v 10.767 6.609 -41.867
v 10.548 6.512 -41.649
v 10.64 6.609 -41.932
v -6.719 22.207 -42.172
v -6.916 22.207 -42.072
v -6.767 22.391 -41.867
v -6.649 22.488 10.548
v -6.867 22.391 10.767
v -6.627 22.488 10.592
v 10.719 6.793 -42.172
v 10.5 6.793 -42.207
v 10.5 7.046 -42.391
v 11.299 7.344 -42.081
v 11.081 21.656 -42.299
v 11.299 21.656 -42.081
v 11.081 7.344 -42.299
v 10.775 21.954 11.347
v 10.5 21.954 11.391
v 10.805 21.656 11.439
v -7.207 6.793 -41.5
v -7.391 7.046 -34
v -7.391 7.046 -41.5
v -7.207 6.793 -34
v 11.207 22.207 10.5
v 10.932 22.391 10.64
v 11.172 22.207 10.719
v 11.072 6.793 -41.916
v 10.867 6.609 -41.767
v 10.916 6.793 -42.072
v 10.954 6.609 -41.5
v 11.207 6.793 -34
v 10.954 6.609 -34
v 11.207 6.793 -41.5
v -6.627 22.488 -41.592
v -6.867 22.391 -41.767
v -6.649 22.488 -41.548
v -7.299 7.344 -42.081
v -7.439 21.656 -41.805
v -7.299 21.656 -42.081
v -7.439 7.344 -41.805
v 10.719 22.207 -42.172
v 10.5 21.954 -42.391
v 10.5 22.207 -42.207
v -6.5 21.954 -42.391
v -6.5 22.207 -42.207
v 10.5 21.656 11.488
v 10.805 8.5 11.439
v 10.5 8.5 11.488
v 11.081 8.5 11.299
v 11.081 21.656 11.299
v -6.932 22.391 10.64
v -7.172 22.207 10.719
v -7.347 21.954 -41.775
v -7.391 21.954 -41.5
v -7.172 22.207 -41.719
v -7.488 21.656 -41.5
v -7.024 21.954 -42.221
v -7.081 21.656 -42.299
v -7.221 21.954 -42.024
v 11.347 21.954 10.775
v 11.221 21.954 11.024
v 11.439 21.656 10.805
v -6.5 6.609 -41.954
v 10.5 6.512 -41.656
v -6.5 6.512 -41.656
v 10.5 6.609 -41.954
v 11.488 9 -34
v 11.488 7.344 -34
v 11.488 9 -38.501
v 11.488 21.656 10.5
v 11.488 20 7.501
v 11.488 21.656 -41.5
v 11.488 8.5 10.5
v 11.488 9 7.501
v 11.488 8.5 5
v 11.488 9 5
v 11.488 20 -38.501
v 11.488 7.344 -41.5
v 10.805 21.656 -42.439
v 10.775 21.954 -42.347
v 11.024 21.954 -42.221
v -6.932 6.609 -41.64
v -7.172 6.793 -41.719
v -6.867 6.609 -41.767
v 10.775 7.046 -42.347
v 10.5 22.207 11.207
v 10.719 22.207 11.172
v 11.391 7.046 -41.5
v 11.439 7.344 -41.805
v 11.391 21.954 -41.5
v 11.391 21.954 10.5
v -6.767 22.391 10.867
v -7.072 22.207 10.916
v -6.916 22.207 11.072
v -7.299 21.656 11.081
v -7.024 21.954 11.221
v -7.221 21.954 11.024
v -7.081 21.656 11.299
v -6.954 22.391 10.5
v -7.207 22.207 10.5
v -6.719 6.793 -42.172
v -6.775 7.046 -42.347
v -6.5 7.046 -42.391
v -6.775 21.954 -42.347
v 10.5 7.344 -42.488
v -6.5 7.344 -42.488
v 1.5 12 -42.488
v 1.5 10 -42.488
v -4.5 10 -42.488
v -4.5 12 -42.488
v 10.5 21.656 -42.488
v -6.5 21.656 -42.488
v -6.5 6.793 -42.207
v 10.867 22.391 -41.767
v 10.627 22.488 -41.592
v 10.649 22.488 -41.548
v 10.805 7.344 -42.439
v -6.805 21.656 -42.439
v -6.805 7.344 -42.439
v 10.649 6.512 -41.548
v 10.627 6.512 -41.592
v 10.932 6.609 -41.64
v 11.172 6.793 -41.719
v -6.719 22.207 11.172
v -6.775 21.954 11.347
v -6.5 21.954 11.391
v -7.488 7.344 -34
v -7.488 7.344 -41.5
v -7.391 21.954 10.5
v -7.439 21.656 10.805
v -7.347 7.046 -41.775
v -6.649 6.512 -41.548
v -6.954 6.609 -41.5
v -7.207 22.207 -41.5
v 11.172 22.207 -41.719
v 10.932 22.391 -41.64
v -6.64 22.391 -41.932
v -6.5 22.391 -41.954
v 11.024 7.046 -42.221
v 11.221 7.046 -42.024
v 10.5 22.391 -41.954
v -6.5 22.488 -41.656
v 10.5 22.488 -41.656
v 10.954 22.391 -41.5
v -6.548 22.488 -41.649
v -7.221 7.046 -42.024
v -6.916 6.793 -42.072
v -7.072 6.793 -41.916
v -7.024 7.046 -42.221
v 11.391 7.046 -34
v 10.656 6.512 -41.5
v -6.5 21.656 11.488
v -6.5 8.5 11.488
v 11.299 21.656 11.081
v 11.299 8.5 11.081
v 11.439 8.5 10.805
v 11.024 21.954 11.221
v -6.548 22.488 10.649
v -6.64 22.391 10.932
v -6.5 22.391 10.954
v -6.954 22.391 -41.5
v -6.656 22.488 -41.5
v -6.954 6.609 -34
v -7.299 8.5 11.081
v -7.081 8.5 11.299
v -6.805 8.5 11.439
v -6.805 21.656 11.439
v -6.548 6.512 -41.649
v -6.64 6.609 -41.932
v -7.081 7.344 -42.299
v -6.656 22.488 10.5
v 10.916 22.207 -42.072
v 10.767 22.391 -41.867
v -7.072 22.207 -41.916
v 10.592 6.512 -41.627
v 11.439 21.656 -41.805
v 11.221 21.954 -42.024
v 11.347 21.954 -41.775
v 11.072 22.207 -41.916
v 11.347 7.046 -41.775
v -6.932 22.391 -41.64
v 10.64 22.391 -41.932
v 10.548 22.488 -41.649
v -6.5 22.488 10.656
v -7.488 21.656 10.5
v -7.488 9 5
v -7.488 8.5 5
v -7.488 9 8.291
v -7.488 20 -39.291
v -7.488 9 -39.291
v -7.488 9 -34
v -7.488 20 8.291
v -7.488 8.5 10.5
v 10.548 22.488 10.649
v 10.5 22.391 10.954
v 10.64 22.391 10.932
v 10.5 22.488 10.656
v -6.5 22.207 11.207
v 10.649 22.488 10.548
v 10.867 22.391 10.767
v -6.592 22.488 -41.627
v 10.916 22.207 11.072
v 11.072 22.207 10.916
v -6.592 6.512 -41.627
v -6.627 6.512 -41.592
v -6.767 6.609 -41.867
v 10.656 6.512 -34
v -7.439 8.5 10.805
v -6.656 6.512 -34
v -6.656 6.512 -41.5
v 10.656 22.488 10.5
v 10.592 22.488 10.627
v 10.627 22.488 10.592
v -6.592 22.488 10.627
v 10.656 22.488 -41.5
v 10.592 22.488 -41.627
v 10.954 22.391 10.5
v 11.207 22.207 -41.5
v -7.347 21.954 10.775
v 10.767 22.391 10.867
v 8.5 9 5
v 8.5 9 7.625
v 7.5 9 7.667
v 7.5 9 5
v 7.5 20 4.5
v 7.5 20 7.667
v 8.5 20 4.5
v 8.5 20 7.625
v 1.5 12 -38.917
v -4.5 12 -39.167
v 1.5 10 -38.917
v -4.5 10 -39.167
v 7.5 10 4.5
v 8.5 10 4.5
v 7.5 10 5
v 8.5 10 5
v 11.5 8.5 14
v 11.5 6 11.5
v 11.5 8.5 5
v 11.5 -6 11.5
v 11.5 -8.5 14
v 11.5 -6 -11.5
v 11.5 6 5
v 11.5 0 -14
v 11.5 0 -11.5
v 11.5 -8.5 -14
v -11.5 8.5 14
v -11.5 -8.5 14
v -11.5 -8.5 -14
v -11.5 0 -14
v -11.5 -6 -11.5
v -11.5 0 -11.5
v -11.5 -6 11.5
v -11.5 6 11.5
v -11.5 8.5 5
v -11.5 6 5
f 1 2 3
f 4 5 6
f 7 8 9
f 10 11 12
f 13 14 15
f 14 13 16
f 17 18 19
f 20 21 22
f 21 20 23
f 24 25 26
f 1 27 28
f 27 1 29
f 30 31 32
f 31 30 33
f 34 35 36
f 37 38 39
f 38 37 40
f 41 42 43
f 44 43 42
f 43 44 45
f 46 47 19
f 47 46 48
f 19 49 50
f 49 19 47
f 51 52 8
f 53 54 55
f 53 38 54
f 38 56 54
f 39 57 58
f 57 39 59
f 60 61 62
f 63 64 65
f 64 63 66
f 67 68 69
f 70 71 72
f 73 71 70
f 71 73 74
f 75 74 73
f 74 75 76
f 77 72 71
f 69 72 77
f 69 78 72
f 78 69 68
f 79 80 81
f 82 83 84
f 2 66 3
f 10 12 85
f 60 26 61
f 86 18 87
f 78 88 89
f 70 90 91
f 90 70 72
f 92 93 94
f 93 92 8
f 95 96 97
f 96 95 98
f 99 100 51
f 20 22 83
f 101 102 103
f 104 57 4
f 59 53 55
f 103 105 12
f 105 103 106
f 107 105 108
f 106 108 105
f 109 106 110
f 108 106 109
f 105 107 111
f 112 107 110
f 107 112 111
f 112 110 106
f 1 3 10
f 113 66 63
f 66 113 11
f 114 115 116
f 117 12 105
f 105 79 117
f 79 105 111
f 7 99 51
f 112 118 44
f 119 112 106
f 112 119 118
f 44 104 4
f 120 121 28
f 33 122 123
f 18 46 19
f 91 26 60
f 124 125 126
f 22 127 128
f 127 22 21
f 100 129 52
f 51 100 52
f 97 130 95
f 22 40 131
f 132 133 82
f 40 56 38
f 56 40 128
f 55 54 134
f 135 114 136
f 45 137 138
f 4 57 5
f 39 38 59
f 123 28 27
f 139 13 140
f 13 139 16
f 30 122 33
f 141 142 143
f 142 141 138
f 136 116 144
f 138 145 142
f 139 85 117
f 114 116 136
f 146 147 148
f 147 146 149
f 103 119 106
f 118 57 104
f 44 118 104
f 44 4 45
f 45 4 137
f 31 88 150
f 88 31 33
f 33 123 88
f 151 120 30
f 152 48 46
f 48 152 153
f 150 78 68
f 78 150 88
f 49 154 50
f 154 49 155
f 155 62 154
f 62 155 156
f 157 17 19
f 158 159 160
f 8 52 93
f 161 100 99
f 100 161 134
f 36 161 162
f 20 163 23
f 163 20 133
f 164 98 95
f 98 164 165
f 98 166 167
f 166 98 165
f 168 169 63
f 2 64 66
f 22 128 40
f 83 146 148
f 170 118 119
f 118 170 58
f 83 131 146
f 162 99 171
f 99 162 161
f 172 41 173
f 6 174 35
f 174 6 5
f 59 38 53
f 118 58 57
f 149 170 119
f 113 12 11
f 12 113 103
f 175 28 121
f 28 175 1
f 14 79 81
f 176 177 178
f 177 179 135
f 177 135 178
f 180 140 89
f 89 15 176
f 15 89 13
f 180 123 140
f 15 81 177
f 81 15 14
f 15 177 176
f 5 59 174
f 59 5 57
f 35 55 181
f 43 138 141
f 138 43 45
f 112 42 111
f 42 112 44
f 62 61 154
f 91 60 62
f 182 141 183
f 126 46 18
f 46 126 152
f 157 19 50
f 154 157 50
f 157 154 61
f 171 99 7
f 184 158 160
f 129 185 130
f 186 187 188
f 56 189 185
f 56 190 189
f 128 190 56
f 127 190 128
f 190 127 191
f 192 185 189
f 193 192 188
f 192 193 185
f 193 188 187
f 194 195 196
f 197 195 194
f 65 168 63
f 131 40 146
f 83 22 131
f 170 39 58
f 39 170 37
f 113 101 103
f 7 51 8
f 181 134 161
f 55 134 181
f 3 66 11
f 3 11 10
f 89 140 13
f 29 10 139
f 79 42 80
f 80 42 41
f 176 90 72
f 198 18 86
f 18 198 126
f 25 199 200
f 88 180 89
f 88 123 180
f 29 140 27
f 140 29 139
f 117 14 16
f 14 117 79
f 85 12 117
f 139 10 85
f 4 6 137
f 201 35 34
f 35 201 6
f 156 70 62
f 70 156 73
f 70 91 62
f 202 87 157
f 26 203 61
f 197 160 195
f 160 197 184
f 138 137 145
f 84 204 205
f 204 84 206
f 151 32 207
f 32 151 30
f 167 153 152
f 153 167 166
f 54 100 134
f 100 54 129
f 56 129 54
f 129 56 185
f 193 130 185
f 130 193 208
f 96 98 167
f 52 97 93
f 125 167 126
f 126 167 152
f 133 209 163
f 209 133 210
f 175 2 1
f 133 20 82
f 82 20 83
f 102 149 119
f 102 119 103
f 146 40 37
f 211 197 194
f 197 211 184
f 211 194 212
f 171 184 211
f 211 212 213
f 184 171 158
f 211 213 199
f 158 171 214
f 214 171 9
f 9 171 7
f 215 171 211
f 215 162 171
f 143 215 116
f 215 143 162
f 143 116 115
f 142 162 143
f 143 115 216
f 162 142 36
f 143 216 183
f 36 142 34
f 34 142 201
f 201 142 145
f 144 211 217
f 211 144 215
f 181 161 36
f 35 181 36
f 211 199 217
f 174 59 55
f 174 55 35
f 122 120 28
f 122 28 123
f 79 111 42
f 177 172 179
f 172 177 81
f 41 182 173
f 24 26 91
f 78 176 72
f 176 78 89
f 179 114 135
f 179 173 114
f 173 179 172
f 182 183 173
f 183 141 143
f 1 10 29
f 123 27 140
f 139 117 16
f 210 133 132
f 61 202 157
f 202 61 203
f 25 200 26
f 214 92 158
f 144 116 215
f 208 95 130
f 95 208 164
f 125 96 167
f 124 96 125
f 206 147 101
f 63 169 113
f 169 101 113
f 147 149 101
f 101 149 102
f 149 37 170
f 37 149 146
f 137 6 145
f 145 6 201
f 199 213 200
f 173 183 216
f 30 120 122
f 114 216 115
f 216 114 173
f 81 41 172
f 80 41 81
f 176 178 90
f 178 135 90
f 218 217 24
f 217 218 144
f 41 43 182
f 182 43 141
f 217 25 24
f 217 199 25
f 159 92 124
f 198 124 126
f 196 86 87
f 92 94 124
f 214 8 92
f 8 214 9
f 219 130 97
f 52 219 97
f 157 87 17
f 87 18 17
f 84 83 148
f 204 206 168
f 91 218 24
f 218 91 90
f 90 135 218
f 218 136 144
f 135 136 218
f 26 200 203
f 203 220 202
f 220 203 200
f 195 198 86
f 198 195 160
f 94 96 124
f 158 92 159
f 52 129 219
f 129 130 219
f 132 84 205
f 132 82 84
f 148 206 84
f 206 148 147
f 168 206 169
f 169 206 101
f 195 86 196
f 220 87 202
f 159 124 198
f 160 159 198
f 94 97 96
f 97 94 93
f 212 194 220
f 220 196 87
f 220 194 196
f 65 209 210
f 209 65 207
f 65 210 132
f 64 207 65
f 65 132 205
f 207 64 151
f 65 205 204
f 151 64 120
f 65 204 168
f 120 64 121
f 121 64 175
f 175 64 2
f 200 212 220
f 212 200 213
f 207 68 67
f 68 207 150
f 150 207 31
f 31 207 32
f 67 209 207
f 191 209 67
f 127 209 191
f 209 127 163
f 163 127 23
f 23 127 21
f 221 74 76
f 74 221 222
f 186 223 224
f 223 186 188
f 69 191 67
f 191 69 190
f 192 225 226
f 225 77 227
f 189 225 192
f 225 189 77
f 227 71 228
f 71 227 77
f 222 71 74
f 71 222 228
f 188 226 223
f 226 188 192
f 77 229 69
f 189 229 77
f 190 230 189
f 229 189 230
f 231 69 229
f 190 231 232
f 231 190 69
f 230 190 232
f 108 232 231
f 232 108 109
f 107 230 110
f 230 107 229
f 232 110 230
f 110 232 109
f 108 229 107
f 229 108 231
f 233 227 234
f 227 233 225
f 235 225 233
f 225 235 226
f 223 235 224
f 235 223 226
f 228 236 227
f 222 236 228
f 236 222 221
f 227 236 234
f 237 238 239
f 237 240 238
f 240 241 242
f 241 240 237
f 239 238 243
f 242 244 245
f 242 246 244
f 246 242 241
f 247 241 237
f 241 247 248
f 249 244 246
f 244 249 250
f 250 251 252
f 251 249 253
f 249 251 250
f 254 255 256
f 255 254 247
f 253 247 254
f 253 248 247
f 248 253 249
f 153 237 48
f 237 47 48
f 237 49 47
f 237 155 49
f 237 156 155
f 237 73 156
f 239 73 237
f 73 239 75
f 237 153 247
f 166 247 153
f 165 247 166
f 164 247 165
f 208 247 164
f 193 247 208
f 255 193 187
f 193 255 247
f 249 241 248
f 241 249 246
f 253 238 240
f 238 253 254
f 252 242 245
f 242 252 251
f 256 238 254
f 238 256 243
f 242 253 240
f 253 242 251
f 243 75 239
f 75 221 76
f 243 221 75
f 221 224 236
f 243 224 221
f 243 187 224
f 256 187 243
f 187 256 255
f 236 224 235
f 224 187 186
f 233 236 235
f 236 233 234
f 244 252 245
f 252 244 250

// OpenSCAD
// file: pivothead_recon.scad
module PivotHead(){
	HEIGHT = 23;
	WIDTH = 12;

	difference() {
		cube(size = [23,17,28], center = true);
		cube(size = [26,12,23], center = true);
	}
}
// main file
include <pivothead_recon.scad> 

RECON_HEIGHT = 11;
RECON_START_WIDTH = 46;
RECON_END_WIDTH = 49;
RECON_LENGTH = 35;

CLIP_LENGTH = 17;
CLIP_DEPTH = 6;
CLIP_THICKNESS = 3;

RECON_BUMP_WIDTH = RECON_END_WIDTH - (CLIP_DEPTH * 2);

module recon() {
	hull() {
		translate([(RECON_END_WIDTH - RECON_START_WIDTH) / 2,-1,0]) cube([RECON_START_WIDTH, 1, RECON_HEIGHT]);
		translate([0, RECON_LENGTH, 0]) cube([RECON_END_WIDTH, 1, RECON_HEIGHT]);
	}
	
	//notch
	#translate([-4,9,RECON_HEIGHT - 3]) cube([6,6,2]);
}

module clip() {

	

	difference() {
		translate([(-1*CLIP_THICKNESS) / 2, 0, (-1*CLIP_THICKNESS) / 2]) 
		difference() {
			hull() {
				cube([RECON_END_WIDTH + CLIP_THICKNESS, CLIP_LENGTH, RECON_HEIGHT + CLIP_THICKNESS]);
				sphere(r=1, $fn=20);
				translate([0,CLIP_LENGTH,0]) sphere(r=1, $fn=20);
				translate([0,CLIP_LENGTH,RECON_HEIGHT + CLIP_THICKNESS]) sphere(r=1, $fn=20);
				translate([0,0,RECON_HEIGHT + CLIP_THICKNESS]) sphere(r=1, $fn=20);
				translate([RECON_END_WIDTH + CLIP_THICKNESS,0,0]) {
					sphere(r=1, $fn=20);
				translate([0,CLIP_LENGTH,0]) sphere(r=1, $fn=20);
				translate([0,CLIP_LENGTH,RECON_HEIGHT + CLIP_THICKNESS]) sphere(r=1, $fn=20);
				translate([0,0,RECON_HEIGHT + CLIP_THICKNESS]) sphere(r=1, $fn=20);
				}
			}
			translate([CLIP_DEPTH + (CLIP_THICKNESS / 2),-5,CLIP_THICKNESS]) 				cube([RECON_BUMP_WIDTH, CLIP_LENGTH + 10, RECON_HEIGHT + CLIP_THICKNESS]);	
		}
		recon();
	}

	#translate([RECON_START_WIDTH - (CLIP_THICKNESS / 2),2,0]) cube([4,1,RECON_HEIGHT]);

}

difference() {
	union() {
		rotate([90,-90,0]){ //Stand up & Flip -- Clip
			translate([-40,-10.5,-20]){  //This shit is fucked up
				clip();
			}
		}
		PivotHead();
	}
	translate([-20,0,-20]){
		#cube([40,10,25]);
	}
}
